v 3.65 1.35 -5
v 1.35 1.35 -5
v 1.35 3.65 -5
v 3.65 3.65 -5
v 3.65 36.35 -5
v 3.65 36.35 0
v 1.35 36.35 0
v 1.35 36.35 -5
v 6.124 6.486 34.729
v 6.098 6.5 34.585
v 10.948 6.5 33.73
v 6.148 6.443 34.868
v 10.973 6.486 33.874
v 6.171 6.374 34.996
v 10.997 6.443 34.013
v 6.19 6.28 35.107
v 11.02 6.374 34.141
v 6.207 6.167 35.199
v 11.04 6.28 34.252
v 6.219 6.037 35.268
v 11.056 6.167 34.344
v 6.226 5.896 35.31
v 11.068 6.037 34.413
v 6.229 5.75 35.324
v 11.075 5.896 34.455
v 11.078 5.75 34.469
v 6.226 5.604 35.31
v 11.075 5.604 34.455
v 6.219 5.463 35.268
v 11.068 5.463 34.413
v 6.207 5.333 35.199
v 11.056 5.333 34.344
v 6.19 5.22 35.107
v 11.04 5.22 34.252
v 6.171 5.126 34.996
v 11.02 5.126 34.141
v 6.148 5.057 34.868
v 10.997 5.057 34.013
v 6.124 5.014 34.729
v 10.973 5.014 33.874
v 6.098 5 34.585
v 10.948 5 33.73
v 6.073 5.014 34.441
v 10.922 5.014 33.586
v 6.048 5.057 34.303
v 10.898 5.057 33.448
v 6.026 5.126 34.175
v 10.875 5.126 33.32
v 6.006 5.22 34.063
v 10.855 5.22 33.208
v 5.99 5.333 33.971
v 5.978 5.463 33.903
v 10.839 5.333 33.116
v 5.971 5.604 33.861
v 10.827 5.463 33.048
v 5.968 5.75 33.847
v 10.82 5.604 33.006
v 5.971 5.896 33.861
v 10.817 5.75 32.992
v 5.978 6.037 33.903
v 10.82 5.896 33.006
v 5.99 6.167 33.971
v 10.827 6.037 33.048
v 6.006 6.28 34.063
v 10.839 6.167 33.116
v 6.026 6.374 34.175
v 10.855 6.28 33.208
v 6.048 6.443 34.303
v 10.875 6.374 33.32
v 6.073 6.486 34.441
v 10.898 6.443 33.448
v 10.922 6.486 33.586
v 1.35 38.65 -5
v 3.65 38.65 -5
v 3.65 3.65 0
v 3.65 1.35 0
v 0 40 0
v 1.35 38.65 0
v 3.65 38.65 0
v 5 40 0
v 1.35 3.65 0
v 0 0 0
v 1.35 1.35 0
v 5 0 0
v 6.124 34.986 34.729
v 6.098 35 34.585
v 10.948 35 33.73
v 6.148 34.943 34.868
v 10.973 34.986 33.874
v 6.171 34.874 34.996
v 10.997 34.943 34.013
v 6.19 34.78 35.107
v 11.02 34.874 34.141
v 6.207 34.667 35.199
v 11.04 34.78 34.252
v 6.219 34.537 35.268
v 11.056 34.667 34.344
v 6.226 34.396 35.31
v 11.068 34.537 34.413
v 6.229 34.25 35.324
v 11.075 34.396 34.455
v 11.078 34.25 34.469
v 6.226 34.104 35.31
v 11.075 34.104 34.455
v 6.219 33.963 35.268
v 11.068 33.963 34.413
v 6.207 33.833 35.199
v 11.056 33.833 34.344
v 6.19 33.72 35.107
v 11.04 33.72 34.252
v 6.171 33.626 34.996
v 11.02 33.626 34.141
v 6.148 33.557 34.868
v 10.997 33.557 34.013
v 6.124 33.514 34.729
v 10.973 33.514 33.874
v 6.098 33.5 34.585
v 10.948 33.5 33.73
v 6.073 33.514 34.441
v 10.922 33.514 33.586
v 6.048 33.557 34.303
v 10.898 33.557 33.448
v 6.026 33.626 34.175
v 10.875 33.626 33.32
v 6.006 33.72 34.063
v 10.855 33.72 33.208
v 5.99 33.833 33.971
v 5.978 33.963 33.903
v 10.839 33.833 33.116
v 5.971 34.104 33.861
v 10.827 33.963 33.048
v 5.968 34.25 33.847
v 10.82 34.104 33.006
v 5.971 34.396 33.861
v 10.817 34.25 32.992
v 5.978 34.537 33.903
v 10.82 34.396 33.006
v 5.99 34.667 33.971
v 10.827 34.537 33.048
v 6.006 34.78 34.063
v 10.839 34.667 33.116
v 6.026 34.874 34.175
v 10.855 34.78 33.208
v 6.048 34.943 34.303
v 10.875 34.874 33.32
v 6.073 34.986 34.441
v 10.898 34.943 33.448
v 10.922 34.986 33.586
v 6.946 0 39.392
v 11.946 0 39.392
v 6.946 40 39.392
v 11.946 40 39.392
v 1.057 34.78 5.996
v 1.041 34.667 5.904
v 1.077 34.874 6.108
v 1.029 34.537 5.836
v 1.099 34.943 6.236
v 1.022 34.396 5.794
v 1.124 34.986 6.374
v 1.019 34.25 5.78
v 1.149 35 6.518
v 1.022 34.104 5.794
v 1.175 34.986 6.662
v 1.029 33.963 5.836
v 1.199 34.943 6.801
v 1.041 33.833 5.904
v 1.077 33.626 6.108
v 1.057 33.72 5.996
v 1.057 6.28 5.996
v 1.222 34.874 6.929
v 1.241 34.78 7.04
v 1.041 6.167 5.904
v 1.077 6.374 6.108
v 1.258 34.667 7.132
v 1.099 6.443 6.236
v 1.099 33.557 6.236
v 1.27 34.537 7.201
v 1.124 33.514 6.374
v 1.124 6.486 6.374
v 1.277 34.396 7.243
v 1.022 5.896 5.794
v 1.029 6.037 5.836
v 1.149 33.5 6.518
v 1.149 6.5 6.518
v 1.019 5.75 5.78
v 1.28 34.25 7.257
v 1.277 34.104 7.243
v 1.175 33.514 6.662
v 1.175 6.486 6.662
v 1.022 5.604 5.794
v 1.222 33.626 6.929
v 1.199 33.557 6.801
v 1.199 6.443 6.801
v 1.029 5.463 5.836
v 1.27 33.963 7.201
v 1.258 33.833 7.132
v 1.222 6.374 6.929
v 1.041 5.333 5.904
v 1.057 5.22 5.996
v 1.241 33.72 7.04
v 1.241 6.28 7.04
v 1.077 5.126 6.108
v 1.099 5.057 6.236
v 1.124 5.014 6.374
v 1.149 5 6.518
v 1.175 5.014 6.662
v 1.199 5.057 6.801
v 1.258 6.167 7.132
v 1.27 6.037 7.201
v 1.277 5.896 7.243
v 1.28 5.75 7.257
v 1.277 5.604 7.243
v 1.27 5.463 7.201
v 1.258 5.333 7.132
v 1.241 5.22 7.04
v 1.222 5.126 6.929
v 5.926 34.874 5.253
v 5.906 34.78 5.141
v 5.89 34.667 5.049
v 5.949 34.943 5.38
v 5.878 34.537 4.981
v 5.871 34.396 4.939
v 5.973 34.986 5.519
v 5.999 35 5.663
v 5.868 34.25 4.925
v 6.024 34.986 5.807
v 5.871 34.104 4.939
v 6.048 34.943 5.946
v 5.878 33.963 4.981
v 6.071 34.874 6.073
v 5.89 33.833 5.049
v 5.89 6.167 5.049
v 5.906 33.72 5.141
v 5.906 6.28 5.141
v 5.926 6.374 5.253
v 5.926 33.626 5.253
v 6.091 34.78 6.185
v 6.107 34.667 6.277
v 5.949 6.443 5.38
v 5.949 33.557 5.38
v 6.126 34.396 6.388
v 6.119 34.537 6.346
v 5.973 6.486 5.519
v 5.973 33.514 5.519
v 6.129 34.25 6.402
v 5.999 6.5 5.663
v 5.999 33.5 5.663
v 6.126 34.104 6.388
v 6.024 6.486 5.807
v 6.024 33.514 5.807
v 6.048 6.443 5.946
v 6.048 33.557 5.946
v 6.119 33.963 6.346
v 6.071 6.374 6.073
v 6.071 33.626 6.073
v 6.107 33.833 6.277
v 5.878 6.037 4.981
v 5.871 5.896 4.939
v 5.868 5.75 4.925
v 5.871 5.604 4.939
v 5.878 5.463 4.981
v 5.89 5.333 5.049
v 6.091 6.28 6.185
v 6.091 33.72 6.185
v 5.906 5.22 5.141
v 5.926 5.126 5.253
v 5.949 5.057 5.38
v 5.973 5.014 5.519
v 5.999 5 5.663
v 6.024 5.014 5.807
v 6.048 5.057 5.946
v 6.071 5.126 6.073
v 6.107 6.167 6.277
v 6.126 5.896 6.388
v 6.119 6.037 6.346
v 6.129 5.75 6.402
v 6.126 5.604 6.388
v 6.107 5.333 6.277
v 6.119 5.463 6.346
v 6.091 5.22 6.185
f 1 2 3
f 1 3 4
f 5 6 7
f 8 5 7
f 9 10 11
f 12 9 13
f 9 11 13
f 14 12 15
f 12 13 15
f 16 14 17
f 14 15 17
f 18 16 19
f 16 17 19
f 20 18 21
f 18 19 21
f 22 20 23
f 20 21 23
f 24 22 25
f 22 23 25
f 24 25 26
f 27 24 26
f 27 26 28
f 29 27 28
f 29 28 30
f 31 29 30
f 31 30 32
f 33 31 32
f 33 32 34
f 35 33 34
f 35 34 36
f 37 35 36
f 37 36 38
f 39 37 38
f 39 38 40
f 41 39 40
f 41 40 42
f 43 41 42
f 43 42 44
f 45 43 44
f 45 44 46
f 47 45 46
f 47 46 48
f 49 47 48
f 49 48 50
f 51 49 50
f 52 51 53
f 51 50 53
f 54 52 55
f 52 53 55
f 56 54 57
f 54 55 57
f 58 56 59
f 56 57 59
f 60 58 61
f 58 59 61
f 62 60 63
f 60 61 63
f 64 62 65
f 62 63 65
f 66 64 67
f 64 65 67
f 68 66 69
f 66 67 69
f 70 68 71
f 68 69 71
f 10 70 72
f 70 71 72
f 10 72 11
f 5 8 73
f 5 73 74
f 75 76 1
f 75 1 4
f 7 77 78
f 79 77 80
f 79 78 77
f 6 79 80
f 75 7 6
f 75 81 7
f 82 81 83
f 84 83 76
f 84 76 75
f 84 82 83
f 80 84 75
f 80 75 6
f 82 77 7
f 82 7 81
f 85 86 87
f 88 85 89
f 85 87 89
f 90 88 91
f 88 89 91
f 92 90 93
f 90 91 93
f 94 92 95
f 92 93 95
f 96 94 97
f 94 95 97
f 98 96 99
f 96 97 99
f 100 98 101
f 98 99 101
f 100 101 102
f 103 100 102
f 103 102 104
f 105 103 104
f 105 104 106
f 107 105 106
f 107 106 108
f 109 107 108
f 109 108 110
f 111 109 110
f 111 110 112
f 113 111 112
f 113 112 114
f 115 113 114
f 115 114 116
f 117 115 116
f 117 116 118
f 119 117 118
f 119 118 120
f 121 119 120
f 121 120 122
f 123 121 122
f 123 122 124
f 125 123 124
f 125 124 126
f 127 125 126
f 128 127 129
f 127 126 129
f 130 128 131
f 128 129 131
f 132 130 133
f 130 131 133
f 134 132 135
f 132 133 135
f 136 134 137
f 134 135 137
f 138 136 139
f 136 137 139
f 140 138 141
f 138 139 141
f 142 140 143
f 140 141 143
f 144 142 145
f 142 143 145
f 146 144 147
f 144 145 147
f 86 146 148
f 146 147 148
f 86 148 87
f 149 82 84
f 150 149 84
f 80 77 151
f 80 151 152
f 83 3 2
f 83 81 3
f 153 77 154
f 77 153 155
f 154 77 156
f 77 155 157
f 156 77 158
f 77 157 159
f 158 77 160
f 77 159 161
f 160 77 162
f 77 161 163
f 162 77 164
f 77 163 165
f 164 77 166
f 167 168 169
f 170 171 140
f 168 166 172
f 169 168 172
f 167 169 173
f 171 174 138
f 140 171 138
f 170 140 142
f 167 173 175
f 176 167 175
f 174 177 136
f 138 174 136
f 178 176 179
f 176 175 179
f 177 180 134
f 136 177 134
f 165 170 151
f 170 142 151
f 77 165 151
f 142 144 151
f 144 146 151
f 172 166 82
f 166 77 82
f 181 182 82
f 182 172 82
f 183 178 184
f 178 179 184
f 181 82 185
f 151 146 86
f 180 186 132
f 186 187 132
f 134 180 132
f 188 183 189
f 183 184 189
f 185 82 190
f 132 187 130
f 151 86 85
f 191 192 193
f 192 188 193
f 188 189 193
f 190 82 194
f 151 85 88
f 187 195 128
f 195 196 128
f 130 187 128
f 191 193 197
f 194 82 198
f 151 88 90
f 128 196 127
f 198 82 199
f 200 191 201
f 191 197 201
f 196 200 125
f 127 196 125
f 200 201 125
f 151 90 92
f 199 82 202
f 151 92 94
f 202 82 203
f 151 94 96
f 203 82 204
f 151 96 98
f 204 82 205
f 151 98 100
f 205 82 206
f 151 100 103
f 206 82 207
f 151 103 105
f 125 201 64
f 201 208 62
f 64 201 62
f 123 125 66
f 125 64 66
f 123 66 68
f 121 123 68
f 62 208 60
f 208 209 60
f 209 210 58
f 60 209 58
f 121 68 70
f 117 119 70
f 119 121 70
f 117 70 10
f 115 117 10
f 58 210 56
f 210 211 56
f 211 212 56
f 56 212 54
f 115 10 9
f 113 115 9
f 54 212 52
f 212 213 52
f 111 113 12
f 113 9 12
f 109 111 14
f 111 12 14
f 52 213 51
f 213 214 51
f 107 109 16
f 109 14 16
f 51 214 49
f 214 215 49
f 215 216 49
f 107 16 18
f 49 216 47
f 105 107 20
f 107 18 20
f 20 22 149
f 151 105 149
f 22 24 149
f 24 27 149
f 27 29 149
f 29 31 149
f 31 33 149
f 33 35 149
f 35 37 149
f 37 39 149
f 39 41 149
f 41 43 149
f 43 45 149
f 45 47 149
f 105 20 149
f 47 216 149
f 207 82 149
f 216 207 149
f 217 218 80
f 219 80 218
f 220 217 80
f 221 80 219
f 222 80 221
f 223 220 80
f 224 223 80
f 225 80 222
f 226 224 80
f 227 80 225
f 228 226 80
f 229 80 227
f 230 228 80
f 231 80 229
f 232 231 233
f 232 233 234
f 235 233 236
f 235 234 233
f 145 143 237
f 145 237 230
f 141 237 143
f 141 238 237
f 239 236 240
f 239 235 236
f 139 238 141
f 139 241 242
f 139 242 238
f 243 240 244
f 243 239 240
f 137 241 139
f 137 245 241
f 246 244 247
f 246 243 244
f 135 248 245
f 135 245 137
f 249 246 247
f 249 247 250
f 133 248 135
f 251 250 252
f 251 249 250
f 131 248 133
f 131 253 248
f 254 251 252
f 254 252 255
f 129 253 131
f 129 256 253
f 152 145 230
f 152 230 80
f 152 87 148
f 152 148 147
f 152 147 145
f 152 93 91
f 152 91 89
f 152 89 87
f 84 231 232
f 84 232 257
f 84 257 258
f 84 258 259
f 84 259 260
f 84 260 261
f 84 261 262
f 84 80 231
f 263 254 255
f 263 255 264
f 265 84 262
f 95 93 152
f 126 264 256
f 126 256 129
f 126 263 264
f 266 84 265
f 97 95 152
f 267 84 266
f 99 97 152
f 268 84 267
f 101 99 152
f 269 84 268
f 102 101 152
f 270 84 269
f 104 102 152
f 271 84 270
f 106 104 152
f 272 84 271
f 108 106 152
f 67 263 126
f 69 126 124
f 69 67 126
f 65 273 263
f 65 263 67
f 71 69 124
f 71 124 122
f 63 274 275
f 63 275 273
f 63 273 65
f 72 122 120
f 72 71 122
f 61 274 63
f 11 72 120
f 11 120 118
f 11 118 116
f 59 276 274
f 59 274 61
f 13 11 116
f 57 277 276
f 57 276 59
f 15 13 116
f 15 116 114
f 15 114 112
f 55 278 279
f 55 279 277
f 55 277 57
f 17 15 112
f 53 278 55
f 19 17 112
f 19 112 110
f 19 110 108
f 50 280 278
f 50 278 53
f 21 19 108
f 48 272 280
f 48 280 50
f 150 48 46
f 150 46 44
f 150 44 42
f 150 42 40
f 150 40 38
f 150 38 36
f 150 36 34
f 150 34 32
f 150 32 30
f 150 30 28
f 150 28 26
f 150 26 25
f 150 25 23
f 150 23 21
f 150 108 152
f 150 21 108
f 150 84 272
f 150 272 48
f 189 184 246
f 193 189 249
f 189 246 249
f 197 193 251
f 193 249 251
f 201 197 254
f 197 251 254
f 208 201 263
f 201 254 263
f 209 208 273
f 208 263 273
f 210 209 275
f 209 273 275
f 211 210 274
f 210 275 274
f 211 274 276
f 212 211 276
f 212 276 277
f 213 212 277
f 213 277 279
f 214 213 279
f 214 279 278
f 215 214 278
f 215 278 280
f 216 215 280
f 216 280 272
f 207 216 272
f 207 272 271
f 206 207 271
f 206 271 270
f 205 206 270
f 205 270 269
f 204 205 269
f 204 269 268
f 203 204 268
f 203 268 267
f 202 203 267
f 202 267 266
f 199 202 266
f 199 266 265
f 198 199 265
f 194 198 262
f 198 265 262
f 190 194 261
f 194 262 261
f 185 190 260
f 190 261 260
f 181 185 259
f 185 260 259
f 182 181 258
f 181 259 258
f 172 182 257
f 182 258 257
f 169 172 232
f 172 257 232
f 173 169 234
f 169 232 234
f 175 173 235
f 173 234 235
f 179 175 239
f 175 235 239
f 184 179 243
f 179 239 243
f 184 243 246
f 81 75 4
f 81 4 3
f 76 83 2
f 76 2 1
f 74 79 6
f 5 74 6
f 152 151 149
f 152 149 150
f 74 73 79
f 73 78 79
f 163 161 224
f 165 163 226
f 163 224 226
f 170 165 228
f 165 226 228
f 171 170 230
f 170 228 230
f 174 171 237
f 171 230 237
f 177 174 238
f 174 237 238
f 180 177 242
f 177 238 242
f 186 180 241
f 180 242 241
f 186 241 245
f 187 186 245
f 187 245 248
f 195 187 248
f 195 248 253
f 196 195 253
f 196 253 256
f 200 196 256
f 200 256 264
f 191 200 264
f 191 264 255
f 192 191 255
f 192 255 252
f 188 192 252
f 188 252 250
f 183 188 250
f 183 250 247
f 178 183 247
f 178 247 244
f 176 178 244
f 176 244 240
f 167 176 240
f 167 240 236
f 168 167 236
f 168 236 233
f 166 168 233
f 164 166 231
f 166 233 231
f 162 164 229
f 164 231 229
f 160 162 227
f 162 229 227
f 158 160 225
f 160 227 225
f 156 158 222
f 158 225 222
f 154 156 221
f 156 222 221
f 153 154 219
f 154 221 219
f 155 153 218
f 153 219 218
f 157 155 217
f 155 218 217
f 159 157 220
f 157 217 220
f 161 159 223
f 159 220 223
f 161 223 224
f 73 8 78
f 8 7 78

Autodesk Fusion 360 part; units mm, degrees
sketch "Sketch1" plane through (0, 0, 0) normal (0, 1, 0) x (1, 0, 0)
  line L0 (0, 0) -> (6.9459, -39.3923)
  line L1 (0, 0) -> (40, 0) construction
  line L2 (0, 0) -> (5, 0)
  line L3 (6.9459, -39.3923) -> (11.9459, -39.3923)
  line L4 (5, 0) -> (11.9459, -39.3923)
  dimension "d1" = 80
  dimension "d2" = 40
  dimension "d3" = 5
  dimension "d4" = 5
extrude "Extrude1" add sketch "Sketch1" along normal blind 40
sketch "Sketch2" plane through (0, 0, 0) normal (0, 0, -1) x (1, 0, 0)
  line L0 (5, 0) -> (0, 0)
  line L1 (0, 0) -> (0, -40)
  line L2 (0, -40) -> (5, -40)
  line L3 (5, -40) -> (5, 0)
  line L4 (0, -40) -> (0, -38.75)
  line L5 (0, -38.75) -> (0, -38.65)
  line L6 (0, -38.65) -> (1.35, -38.65)
  line L7 (1.35, -38.65) -> (3.65, -38.65)
  line L8 (3.65, -38.65) -> (3.65, -36.35)
  line L9 (3.65, -36.35) -> (1.35, -36.35)
  line L10 (1.35, -36.35) -> (1.35, -38.65)
  line L11 (0, 0) -> (0, -1.35)
  line L12 (0, -1.35) -> (1.35, -1.35)
  line L13 (1.35, -1.35) -> (3.65, -1.35)
  line L14 (3.65, -1.35) -> (3.65, -3.65)
  line L15 (3.65, -3.65) -> (1.35, -3.65)
  line L16 (1.35, -3.65) -> (1.35, -1.35)
  dimension "d7" = 1.25
  dimension "d8" = 0.1
  dimension "d9" = 1.35
  dimension "d10" = 2.3
  dimension "d11" = 2.3
  dimension "d12" = 1.35
  dimension "d13" = 1.35
  dimension "d14" = 2.3
  dimension "d15" = 2.3
extrude "Extrude2" add sketch "Sketch2" along normal blind 5 contours L13 L14 L15 L16 | L7 L8 L9 L10
sketch "Sketch3" plane through (4.8492, 0, -0.8551) normal (0.9848, 0, -0.1736) x (0, 1, 0)
  line L0 (0, 40.8682) -> (0, 0.8682)
  line L1 (0, 0.8682) -> (40, 0.8682)
  line L2 (40, 0.8682) -> (40, 40.8682)
  line L3 (40, 40.8682) -> (0, 40.8682)
  line L4 (5.9613, 40.8682) -> (5.9613, 35.8682)
  line L5 (0, 35.8688) -> (5, 35.8688)
  line L6 (5, 35.8688) -> (5, 35.1188)
  line L7 (5, 35.1188) -> (5.75, 35.1188)
  circle A0 centre (5.75, 35.1188) radius 0.75
  line L8 (5.75, 35.1188) -> (34.25, 35.1188)
  circle A1 centre (34.25, 35.1188) radius 0.75
  line L9 (5.75, 35.1188) -> (5.75, 6.6188)
  circle A2 centre (5.75, 6.6188) radius 0.75
  line L10 (5.75, 6.6188) -> (34.25, 6.6188)
  circle A3 centre (34.25, 6.6188) radius 0.75
  dimension "d18" = 5
  dimension "d19" = 5
  dimension "d20" = 0.75
  dimension "d21" = 0.75
  dimension "d22" = 1.5
  dimension "d23" = 28.5
  dimension "d24" = 1.5
  dimension "d25" = 28.5
  dimension "d26" = 1.5
  dimension "d27" = 28.5
  dimension "d28" = 1.5
extrude "Extrude3" cut sketch "Sketch3" against normal blind 7098 contours A1 | A3 | L9 A2 L10 | L9 A2 L10 | L7 A0 L8 | L7 A0 L9 | A0 L8 L9
